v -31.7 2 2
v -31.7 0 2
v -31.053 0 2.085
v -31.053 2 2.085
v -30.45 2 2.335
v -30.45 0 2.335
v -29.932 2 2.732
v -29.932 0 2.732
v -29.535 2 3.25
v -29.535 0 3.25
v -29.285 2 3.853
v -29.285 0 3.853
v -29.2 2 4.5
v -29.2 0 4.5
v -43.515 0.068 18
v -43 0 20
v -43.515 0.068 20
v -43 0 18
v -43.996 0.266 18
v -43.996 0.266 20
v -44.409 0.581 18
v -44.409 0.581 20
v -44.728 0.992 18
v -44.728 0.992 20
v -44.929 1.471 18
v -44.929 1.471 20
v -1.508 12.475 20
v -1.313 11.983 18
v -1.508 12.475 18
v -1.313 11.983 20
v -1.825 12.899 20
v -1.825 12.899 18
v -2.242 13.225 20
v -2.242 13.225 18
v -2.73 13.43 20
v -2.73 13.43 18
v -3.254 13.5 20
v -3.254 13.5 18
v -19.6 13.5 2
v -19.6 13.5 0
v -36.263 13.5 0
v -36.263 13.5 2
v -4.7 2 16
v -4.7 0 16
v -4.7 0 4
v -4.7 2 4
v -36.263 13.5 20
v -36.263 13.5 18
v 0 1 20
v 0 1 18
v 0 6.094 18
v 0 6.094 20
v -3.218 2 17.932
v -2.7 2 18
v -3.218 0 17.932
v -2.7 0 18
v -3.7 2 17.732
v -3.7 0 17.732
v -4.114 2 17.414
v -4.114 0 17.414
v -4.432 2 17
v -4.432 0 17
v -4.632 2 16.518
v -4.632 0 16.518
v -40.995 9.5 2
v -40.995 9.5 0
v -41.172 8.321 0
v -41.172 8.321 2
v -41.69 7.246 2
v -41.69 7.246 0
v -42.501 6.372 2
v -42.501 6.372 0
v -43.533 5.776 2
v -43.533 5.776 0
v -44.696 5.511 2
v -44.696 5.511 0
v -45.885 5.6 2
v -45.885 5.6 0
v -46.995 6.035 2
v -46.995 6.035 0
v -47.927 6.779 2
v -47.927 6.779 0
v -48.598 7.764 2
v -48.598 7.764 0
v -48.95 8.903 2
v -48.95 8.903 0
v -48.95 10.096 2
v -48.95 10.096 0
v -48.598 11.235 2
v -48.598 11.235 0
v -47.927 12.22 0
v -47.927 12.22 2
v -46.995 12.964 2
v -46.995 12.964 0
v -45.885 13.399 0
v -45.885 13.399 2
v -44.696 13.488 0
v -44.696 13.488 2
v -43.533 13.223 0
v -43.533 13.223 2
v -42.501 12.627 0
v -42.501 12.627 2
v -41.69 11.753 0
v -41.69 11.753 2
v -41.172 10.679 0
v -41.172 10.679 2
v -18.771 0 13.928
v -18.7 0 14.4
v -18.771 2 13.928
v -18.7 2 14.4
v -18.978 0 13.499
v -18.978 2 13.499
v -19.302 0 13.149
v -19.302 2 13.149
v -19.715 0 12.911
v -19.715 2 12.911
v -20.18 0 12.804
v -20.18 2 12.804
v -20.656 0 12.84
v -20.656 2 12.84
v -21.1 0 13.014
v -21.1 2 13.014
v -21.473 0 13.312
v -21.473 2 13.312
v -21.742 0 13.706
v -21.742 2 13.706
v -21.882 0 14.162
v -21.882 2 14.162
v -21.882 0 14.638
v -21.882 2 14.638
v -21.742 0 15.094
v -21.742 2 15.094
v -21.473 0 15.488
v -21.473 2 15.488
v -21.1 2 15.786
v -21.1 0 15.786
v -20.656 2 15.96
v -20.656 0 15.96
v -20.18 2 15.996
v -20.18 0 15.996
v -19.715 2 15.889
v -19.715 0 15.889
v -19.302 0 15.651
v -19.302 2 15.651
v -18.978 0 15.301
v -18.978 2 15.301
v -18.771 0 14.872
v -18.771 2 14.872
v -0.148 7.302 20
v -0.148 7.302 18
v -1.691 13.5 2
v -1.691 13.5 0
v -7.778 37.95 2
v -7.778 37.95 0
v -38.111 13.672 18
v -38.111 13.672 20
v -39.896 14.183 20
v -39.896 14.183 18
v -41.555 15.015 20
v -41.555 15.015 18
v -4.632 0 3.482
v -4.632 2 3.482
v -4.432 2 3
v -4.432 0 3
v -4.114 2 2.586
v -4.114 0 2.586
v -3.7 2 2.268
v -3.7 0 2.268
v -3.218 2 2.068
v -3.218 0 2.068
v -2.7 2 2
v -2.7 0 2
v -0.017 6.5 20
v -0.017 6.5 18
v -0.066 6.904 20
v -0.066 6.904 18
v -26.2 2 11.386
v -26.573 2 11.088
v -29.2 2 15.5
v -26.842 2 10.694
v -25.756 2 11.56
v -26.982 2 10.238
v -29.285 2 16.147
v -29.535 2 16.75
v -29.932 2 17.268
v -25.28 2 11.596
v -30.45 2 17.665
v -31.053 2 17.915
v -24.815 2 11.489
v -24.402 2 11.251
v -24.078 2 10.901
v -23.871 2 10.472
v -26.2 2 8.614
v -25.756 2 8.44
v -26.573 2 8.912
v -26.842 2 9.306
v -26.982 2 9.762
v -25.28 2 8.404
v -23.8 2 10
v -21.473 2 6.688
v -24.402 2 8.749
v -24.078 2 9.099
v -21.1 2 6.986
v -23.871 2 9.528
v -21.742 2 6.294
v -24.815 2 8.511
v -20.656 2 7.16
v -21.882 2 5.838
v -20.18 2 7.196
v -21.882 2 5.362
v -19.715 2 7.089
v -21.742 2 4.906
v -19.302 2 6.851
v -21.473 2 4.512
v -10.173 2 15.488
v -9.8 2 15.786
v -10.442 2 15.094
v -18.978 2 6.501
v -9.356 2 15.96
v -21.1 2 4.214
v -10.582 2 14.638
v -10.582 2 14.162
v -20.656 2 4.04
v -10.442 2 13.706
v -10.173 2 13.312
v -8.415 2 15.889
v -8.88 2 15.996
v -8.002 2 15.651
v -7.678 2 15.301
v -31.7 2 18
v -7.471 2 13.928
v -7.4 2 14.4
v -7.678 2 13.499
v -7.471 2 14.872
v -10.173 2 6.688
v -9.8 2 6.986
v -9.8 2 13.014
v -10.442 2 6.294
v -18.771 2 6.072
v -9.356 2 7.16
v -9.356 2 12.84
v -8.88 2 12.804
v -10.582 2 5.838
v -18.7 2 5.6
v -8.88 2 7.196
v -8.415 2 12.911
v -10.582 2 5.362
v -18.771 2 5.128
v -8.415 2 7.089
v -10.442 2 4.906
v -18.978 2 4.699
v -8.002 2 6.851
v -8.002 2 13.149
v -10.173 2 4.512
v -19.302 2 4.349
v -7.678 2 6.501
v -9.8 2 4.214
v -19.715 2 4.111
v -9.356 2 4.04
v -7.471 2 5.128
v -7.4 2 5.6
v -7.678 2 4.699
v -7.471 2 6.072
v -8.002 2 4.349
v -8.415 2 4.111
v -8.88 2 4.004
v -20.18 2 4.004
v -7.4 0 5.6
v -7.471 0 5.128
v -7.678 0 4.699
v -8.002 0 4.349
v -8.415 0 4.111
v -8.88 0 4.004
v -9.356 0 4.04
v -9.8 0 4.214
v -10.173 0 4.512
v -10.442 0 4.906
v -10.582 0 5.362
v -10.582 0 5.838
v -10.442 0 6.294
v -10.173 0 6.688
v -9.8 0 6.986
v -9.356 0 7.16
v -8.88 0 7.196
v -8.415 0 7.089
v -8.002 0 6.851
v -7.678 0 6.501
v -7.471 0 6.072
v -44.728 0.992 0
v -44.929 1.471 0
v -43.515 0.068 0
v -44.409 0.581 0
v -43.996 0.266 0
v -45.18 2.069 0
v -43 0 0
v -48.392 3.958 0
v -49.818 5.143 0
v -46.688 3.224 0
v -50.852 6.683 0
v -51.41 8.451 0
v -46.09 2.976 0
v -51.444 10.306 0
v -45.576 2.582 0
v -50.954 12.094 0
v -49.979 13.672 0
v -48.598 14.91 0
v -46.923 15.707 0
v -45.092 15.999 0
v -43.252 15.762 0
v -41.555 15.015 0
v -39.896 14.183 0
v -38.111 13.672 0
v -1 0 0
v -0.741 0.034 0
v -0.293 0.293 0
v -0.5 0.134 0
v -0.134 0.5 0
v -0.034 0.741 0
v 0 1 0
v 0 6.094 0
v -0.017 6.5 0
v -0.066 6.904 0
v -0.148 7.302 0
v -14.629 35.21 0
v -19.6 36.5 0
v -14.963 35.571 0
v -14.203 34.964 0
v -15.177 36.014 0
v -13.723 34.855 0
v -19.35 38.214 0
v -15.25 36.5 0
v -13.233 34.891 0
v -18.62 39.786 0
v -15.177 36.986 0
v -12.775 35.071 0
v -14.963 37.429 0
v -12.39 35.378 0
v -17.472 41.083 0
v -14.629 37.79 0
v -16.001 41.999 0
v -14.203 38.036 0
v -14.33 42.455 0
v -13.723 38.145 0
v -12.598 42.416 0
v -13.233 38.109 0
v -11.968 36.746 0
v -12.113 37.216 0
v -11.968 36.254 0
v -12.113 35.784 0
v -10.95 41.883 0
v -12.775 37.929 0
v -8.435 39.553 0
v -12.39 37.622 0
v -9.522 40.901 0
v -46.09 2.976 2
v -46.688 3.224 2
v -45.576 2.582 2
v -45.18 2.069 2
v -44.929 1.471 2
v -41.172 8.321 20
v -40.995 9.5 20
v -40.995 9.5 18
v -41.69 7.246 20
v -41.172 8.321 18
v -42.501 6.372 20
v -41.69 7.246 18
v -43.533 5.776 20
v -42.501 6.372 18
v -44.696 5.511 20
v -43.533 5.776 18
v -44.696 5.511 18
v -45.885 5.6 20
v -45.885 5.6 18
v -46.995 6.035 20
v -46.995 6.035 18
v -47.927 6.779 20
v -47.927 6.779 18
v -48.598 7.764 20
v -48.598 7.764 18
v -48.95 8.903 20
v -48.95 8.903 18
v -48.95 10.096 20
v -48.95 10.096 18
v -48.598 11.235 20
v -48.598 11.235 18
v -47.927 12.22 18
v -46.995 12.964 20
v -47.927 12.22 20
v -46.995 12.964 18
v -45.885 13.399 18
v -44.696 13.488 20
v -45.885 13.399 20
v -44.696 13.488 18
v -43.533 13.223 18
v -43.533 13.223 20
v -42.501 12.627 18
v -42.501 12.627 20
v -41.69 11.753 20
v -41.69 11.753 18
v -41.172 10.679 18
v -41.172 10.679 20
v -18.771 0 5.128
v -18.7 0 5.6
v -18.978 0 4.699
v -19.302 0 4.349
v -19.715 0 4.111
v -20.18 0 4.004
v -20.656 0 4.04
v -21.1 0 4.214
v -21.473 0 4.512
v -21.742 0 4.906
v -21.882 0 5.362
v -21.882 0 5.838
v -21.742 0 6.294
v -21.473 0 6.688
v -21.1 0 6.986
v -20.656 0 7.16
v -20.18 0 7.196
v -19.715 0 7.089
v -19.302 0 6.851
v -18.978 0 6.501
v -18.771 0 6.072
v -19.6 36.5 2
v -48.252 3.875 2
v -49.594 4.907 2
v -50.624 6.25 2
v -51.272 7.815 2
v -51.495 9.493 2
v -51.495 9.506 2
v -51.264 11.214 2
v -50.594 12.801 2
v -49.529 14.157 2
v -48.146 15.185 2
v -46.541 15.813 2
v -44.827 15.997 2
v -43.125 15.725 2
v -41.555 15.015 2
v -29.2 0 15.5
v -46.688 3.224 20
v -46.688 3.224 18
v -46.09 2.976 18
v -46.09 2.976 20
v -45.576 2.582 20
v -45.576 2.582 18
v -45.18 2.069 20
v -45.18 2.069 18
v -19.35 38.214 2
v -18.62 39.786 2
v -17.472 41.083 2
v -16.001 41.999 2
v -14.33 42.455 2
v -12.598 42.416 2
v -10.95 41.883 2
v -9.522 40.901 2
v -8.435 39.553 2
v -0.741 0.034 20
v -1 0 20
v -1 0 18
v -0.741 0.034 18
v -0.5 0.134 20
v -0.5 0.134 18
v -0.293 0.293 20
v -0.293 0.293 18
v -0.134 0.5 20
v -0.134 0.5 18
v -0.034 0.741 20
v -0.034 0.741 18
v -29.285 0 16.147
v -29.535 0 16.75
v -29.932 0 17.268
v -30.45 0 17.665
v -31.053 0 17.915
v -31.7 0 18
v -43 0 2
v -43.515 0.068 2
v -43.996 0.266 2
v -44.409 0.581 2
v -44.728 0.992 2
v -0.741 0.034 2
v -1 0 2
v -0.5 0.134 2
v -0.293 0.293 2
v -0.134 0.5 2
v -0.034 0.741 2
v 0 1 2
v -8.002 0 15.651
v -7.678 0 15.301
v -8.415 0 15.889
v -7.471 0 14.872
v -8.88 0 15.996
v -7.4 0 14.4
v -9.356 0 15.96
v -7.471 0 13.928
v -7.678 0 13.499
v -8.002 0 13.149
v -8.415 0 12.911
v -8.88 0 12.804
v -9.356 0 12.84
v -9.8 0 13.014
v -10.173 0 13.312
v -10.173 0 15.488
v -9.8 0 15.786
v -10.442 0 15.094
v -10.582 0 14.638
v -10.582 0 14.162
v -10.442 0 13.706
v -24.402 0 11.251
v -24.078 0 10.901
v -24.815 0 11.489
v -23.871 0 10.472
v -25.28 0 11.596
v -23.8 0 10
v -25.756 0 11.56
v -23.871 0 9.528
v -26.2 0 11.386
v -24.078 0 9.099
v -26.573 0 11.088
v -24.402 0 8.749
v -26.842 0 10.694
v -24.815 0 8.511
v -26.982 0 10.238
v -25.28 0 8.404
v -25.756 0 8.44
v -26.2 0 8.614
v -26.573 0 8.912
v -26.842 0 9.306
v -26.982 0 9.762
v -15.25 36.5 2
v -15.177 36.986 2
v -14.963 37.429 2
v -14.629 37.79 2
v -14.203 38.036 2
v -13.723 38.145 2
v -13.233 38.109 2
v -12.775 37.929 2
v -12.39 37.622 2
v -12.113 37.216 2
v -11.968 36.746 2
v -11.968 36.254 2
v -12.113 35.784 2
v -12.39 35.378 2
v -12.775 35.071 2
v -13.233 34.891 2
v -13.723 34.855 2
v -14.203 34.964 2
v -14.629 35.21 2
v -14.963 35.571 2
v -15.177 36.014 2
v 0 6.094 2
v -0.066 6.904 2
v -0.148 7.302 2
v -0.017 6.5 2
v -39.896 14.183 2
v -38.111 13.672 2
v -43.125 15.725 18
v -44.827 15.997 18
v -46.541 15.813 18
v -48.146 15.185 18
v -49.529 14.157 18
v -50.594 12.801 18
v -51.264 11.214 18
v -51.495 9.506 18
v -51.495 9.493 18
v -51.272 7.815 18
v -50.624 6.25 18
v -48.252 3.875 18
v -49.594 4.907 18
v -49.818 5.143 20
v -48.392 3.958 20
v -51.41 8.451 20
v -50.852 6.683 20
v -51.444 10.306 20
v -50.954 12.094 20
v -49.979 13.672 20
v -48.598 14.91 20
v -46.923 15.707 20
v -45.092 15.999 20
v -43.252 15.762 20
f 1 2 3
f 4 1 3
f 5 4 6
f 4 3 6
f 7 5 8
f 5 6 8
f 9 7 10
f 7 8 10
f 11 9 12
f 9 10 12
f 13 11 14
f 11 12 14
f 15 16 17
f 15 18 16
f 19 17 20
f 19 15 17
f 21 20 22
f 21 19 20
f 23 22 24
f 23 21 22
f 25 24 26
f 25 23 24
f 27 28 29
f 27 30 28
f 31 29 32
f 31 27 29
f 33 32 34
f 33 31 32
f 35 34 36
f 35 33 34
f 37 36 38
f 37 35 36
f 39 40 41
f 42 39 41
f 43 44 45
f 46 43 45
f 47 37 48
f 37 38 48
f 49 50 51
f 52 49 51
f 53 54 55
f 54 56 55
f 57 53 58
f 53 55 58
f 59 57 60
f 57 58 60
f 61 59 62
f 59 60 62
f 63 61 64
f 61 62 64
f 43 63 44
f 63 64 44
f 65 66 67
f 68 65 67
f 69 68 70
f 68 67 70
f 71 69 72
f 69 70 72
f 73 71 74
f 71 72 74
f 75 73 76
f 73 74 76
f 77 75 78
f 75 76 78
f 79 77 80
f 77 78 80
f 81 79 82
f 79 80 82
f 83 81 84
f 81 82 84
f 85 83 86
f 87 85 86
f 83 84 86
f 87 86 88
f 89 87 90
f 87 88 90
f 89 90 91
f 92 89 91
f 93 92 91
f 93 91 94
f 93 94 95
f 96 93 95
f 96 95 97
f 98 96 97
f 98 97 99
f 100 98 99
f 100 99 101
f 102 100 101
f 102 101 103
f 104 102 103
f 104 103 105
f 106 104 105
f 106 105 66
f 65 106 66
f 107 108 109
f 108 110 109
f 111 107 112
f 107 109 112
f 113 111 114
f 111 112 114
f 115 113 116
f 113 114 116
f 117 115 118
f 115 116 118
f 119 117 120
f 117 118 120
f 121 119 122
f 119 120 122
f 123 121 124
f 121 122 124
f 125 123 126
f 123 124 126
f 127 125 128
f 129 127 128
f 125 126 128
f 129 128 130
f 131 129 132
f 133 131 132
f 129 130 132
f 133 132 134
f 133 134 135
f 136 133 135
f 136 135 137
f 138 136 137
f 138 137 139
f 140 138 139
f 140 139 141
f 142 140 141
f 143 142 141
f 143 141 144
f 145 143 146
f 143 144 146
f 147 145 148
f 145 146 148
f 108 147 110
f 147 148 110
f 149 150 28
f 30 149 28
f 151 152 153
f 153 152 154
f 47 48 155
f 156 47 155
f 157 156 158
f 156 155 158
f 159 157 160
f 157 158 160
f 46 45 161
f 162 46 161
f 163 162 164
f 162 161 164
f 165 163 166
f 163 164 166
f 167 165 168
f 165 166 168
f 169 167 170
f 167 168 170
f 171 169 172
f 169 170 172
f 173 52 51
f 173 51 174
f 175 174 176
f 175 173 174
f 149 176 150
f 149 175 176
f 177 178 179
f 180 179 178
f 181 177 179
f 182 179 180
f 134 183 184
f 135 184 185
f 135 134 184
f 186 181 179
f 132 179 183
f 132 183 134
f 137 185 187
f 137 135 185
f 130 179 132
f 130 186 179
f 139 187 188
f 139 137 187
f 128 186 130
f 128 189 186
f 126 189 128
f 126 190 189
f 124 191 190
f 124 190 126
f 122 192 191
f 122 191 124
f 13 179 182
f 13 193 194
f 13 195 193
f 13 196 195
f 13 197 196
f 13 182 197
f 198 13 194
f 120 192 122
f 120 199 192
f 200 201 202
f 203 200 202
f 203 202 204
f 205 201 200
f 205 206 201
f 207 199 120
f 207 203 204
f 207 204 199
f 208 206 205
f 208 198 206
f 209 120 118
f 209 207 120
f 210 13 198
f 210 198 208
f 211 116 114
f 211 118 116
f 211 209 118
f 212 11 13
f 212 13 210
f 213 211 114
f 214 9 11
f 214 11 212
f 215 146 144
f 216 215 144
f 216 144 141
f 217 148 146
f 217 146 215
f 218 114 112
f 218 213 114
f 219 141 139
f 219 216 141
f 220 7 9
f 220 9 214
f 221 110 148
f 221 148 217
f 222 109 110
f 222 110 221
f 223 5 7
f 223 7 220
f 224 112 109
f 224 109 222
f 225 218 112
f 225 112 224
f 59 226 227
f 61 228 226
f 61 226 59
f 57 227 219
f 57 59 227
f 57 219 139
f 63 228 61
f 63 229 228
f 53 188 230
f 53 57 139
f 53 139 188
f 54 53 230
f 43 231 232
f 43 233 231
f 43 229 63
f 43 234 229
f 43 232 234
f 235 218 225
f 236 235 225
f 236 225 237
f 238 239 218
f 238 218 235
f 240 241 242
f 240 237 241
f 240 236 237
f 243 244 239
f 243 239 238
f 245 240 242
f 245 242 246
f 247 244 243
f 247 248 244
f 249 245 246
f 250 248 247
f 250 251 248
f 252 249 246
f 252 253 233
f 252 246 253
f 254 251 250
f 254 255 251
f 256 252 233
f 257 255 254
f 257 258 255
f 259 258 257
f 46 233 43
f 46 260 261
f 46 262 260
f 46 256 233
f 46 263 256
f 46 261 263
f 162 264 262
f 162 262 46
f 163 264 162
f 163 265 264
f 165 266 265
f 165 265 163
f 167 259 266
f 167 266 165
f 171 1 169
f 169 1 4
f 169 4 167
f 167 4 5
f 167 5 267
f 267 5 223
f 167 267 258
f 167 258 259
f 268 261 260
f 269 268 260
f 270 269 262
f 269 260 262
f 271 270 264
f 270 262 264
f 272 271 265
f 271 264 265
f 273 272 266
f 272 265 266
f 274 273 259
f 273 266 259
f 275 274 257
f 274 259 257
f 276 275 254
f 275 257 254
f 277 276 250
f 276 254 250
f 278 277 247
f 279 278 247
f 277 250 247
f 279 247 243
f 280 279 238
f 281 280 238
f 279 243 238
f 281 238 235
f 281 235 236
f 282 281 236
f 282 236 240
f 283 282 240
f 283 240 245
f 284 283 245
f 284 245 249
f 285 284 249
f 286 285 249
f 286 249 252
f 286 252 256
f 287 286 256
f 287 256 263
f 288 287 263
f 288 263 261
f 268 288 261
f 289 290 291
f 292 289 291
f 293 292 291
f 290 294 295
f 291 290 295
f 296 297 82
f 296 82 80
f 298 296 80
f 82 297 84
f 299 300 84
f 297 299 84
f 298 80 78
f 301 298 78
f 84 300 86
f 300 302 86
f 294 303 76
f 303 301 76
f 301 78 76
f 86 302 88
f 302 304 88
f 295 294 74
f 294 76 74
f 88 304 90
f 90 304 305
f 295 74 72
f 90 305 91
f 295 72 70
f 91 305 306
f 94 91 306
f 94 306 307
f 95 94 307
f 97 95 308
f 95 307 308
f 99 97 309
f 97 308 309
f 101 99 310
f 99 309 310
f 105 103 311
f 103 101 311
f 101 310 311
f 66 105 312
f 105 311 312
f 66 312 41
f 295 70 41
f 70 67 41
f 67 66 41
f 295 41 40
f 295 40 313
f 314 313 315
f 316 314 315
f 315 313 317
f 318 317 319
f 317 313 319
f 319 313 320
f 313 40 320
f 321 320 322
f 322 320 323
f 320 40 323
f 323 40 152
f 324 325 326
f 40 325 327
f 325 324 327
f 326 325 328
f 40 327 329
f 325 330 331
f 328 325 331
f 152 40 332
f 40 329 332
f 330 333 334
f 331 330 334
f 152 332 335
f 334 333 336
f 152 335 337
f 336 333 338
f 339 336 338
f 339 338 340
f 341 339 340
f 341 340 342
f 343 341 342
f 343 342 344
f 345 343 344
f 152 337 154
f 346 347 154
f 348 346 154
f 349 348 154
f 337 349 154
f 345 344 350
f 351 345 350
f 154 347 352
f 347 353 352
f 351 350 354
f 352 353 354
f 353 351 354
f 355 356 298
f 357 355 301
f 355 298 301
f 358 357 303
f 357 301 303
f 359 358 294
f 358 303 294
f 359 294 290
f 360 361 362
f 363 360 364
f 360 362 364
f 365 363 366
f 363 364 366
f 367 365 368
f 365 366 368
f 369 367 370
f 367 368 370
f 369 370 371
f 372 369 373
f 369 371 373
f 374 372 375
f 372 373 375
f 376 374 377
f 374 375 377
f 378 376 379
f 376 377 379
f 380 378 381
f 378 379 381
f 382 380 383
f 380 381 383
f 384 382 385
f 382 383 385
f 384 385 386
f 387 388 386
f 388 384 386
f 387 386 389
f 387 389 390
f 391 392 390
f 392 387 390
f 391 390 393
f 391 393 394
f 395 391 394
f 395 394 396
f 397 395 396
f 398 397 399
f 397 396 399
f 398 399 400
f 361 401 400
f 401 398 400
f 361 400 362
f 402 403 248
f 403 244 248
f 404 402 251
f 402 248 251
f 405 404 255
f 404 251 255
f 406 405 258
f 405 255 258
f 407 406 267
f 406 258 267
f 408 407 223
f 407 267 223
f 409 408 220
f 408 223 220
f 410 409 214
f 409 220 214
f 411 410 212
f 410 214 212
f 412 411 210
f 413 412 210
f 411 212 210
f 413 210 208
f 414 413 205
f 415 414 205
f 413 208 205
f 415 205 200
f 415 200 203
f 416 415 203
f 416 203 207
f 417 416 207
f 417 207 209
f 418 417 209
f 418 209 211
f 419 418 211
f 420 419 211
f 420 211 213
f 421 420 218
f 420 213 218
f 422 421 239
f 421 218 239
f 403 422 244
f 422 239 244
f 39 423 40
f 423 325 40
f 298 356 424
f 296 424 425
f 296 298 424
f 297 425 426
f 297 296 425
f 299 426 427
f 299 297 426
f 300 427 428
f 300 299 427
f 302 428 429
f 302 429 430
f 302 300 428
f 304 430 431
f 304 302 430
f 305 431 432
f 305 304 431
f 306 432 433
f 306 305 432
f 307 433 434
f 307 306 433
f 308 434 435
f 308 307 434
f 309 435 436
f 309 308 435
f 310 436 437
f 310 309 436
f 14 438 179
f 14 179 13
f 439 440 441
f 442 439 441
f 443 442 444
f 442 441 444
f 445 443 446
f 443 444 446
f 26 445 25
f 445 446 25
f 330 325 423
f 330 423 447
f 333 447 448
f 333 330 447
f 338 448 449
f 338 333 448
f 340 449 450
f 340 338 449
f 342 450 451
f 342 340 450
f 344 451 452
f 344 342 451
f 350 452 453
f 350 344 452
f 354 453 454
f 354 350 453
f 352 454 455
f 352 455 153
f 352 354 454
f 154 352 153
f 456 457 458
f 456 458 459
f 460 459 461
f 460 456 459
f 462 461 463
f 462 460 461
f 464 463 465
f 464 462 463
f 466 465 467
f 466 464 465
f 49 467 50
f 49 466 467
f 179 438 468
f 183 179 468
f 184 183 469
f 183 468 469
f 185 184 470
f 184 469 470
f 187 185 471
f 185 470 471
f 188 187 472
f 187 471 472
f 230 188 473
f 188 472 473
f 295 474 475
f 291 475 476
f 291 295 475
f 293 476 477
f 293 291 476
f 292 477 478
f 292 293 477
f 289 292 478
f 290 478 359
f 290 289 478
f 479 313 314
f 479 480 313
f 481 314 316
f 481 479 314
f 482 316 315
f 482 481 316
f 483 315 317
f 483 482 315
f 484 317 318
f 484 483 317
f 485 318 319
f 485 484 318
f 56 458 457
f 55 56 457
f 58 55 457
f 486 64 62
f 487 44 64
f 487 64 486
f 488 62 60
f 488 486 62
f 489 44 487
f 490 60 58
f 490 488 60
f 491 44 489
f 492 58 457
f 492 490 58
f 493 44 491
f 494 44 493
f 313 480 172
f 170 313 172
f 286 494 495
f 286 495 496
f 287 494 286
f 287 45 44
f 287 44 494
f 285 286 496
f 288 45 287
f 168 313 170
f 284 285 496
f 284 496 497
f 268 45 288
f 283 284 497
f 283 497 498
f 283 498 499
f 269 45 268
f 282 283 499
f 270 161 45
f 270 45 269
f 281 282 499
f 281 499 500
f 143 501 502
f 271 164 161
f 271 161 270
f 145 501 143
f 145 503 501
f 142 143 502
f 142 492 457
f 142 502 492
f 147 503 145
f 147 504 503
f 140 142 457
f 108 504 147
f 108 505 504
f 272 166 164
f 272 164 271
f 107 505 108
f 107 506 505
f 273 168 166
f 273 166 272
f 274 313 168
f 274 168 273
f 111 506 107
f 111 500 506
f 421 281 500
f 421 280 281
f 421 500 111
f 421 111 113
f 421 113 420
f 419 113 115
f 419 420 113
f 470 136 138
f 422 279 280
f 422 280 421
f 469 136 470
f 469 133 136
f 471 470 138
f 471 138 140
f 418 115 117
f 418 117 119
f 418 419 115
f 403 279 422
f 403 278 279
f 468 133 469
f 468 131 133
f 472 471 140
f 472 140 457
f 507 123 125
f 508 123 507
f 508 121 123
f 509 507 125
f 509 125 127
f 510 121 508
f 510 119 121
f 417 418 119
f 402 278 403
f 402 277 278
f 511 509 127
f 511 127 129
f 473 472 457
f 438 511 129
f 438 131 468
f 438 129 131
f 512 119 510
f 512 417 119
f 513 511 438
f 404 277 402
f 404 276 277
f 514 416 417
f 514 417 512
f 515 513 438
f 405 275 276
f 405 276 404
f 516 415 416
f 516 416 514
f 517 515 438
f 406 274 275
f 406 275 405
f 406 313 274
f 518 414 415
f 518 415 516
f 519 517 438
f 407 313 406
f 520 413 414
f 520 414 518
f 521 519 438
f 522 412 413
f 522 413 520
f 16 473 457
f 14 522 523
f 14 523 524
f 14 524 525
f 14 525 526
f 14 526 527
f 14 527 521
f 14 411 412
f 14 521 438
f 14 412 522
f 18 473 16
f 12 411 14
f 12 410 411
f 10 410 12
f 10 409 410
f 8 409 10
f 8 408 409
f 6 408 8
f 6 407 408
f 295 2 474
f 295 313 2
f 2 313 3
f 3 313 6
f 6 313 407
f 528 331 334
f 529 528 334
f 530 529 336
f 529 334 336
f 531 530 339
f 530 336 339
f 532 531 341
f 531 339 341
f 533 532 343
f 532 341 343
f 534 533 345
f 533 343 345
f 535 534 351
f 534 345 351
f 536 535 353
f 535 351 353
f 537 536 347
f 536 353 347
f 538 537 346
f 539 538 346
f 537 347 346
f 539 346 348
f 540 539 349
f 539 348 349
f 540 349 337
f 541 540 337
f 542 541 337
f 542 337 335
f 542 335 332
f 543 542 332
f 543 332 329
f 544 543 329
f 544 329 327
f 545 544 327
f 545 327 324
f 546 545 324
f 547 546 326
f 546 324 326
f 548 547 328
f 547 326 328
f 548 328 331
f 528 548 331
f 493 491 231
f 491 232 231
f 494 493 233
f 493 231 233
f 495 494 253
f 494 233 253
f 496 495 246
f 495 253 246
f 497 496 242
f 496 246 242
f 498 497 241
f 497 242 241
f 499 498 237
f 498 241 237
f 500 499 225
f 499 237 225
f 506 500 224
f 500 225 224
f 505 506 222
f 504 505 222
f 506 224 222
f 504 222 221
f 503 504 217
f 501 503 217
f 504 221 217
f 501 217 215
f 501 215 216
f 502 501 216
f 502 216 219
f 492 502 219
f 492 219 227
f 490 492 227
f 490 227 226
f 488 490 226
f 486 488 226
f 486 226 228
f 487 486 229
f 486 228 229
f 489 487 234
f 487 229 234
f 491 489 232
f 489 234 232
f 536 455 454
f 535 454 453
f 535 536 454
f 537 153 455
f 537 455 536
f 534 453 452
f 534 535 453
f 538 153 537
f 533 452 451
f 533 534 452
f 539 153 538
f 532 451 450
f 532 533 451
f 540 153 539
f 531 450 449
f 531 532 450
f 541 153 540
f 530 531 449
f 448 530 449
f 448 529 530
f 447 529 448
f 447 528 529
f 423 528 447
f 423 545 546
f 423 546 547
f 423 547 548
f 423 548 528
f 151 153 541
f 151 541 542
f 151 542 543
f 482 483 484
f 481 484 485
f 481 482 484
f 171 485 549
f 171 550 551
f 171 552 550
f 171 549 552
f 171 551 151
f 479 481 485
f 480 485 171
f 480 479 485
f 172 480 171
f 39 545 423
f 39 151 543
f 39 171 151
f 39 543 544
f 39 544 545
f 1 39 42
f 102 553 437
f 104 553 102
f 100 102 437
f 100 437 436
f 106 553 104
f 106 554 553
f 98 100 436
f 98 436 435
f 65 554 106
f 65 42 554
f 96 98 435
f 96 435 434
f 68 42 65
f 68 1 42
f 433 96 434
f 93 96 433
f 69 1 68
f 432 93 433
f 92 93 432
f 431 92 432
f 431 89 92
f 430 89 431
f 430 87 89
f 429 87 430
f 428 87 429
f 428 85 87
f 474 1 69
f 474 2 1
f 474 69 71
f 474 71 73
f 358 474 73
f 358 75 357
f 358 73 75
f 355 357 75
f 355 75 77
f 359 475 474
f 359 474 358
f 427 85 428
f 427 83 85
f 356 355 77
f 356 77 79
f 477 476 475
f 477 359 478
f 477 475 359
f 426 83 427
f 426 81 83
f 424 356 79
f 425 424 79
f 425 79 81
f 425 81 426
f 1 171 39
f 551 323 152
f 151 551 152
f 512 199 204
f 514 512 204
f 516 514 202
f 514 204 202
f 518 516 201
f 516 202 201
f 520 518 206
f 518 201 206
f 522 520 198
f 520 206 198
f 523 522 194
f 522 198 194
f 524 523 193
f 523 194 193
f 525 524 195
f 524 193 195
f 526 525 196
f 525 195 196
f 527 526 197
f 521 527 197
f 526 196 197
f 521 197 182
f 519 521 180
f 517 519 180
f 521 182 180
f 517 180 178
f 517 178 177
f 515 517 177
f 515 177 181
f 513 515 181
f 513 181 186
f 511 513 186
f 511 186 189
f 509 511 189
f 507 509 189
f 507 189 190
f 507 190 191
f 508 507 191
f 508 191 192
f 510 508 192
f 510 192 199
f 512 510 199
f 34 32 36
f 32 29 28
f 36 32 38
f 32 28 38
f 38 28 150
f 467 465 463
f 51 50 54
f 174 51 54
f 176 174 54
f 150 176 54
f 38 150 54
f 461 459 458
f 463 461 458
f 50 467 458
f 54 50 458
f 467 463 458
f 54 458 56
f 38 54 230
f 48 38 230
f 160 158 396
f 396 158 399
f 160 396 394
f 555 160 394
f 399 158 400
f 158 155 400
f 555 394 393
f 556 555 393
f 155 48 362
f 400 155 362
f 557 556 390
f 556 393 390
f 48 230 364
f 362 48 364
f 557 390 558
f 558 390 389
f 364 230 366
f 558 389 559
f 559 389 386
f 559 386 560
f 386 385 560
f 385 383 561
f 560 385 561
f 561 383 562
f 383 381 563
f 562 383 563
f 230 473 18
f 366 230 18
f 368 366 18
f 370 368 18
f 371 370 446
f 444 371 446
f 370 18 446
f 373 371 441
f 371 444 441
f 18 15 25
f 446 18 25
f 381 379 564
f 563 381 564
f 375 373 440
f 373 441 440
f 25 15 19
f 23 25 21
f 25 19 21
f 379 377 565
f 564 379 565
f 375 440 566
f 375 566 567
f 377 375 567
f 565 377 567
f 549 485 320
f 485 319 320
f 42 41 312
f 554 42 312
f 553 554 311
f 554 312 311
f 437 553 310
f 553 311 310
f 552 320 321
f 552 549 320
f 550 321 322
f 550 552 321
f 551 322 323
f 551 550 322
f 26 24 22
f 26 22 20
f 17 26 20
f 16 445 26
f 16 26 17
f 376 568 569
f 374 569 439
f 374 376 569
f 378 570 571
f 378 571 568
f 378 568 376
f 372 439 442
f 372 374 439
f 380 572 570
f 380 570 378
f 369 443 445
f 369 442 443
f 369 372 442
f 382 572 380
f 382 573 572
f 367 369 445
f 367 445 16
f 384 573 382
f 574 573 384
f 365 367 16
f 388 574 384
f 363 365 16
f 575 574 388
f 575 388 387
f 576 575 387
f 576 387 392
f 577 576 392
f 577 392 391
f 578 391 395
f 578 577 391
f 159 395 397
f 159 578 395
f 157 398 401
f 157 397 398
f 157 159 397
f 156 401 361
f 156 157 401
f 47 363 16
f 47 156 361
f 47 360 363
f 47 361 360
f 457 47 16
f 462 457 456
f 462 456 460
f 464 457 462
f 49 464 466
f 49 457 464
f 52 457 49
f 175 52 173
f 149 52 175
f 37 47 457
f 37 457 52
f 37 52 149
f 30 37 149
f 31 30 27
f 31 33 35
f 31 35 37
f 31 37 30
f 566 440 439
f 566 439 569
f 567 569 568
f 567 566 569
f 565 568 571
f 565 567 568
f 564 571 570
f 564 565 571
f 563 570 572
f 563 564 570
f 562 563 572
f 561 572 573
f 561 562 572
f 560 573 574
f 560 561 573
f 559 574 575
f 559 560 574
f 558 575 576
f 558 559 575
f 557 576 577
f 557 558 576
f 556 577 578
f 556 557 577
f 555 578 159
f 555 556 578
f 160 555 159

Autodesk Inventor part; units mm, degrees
ref_plane "YZ Plane" through (0, 0, 0) normal (1, 0, 0) x (0, 1, 0)
ref_plane "XZ Plane" through (0, 0, 0) normal (0, 1, 0) x (-1, 0, 0)
ref_plane "XY Plane" through (0, 0, 0) normal (0, 0, 1) x (1, 0, 0)
sketch "草圖1" plane through (0, 0, 0) normal (0, 0, 1) x (1, 0, 0)
  line L0 (0, 0) -> (-43, 0)
  line L1 (0, 0) -> (0, 6.7073)
  line L2 (0, 6.7073) -> (-1.691, 13.5)
  line L3 (-1.691, 13.5) -> (-36.2631, 13.5)
  arc A0 (-41.5549, 15.0149) -> (-36.2631, 13.5) centre (-36.2631, 23.5) ccw
  arc A1 (-41.5549, 15.0149) -> (-46.6885, 3.2242) centre (-44.9946, 9.4996) ccw
  arc A2 (-44.9289, 1.4714) -> (-46.6885, 3.2242) centre (-47.34, 0.8106) ccw
  arc A3 (-44.9289, 1.4714) -> (-43, 0) centre (-43, 2) ccw
  circle A4 centre (-44.9946, 9.4996) radius 4
  dimension "d0" = 43
  dimension "d1" = 13.5
  dimension "d2" = 10
  dimension "d3" = 2
  dimension "d6" = 2.5
  dimension "d7" = 6.5
  dimension "d8" = 4.899
  dimension "d9" = 2.426
  dimension "d10" = 7
  dimension "d11" = 6.7073
  dimension "d12" = 8
extrude "擠出1" add sketch "草圖1" along normal blind 20
sketch "草圖2" plane through (-36.2631, 13.5, 0) normal (0, 1, 0) x (1, 0, 0)
  line L0 (36.2631, 0) -> (36.2631, -20) construction
  line L1 (34.572, -20) -> (0, -20) projected
  line L2 (34.572, 0) -> (34.572, -20) projected
  arc A0 (31.5631, -16) -> (33.5631, -18) centre (33.5631, -16) ccw
  line L3 (31.5631, -16) -> (31.5631, -4)
  arc A1 (33.5631, -2) -> (31.5631, -4) centre (33.5631, -4) ccw
  line L4 (33.5631, -18) -> (4.5631, -18)
  line L5 (33.5631, -2) -> (4.5631, -2)
  arc A2 (4.5631, -18) -> (7.0631, -15.5) centre (4.5631, -15.5) ccw
  line L6 (7.0631, -15.5) -> (7.0631, -4.5)
  arc A3 (7.0631, -4.5) -> (4.5631, -2) centre (4.5631, -4.5) ccw
  circle A4 centre (27.2631, -14.4) radius 1.6
  line L7 (27.2631, -14.4) -> (27.2631, -5.6) construction
  circle A5 centre (27.2631, -5.6) radius 1.6
  line L8 (27.2631, -14.4) -> (15.9631, -14.4) construction
  line L9 (15.9631, -14.4) -> (15.9631, -5.6) construction
  circle A6 centre (15.9631, -14.4) radius 1.6
  circle A7 centre (15.9631, -5.6) radius 1.6
  circle A8 centre (10.8631, -10) radius 1.6
  line L10 (33.5631, -18) -> (36.2631, -18)
  line L11 (36.2631, 0) -> (36.2631, -20) projected
  line L12 (33.5631, -2) -> (36.2631, -2)
  line L13 (36.2631, -18) -> (36.2631, -2)
  line L14 (-15.2315, 0) -> (-15.2315, -20) projected
  line L15 (4.5631, -18) -> (-15.2315, -18)
  line L16 (4.5631, -2) -> (-15.2315, -2)
  line L17 (-15.2315, -18) -> (-15.2315, -2)
  dimension "d22" = 2
  dimension "d24" = 2
  dimension "d25" = 2
  dimension "d26" = 4.7
  dimension "d27" = 16
  dimension "d28" = 29
  dimension "d29" = 2.5
  dimension "d30" = 2.5
  dimension "d31" = 3.2
  dimension "d32" = 4.3
  dimension "d33" = 3.6
  dimension "d34" = 8.8
  dimension "d35" = 11.3
  dimension "d36" = 8.8
  dimension "d38" = 23.709
  dimension "d39" = 10
extrude "擠出2" cut sketch "草圖2" against normal blind 11.5 contours A1 L3 A0 L4 A2 L6 A3 L5 | A4 | A5 | A6 | A7 | A8
extrude "擠出3" cut sketch "草圖2" against normal through all contours A4 | A5 | A6 | A7 | A8
extrude "擠出4" cut sketch "草圖2" along normal through all both and the other way through all contours L12 L11 L10 L2 | L2 L10 A0 L3 A1 L12 | A3 L6 A2 L15 L14 L16
sketch "草圖3" plane through (0, 0, 0) normal (0, 0, -1) x (-1, 0, 0)
  line L0 (0, 6.7073) -> (0, 0) projected
  line L1 (0, 6.7073) -> (7.7777, 37.9495)
  line L2 (0, 6.7073) -> (1.691, 13.5) projected
  arc A0 (19.6, 36.5) -> (7.7777, 37.9495) centre (13.6, 36.5) ccw
  line L3 (19.6, 36.5) -> (19.6, 13.5)
  line L4 (19.6, 13.5) -> (0, 6.7073)
  line L5 (43, 0) -> (0, 0) projected
  circle A1 centre (13.6, 36.5) radius 1.65
  dimension "d46" = 36.5
  dimension "d47" = 6
  dimension "d48" = 23
  dimension "d49" = 3.3
extrude "擠出5" add sketch "草圖3" against normal blind 2
fillet "圓角1" radius 1 2 edges at (0, 0, 19) (0, 0, 1)
fillet "圓角1" radius 5 2 edges at (0, 6.7073, 19) (0, 6.7073, 1)
fillet "圓角1" radius 2 1 edges at (-1.691, 13.5, 19)
properties part number "front joint"
